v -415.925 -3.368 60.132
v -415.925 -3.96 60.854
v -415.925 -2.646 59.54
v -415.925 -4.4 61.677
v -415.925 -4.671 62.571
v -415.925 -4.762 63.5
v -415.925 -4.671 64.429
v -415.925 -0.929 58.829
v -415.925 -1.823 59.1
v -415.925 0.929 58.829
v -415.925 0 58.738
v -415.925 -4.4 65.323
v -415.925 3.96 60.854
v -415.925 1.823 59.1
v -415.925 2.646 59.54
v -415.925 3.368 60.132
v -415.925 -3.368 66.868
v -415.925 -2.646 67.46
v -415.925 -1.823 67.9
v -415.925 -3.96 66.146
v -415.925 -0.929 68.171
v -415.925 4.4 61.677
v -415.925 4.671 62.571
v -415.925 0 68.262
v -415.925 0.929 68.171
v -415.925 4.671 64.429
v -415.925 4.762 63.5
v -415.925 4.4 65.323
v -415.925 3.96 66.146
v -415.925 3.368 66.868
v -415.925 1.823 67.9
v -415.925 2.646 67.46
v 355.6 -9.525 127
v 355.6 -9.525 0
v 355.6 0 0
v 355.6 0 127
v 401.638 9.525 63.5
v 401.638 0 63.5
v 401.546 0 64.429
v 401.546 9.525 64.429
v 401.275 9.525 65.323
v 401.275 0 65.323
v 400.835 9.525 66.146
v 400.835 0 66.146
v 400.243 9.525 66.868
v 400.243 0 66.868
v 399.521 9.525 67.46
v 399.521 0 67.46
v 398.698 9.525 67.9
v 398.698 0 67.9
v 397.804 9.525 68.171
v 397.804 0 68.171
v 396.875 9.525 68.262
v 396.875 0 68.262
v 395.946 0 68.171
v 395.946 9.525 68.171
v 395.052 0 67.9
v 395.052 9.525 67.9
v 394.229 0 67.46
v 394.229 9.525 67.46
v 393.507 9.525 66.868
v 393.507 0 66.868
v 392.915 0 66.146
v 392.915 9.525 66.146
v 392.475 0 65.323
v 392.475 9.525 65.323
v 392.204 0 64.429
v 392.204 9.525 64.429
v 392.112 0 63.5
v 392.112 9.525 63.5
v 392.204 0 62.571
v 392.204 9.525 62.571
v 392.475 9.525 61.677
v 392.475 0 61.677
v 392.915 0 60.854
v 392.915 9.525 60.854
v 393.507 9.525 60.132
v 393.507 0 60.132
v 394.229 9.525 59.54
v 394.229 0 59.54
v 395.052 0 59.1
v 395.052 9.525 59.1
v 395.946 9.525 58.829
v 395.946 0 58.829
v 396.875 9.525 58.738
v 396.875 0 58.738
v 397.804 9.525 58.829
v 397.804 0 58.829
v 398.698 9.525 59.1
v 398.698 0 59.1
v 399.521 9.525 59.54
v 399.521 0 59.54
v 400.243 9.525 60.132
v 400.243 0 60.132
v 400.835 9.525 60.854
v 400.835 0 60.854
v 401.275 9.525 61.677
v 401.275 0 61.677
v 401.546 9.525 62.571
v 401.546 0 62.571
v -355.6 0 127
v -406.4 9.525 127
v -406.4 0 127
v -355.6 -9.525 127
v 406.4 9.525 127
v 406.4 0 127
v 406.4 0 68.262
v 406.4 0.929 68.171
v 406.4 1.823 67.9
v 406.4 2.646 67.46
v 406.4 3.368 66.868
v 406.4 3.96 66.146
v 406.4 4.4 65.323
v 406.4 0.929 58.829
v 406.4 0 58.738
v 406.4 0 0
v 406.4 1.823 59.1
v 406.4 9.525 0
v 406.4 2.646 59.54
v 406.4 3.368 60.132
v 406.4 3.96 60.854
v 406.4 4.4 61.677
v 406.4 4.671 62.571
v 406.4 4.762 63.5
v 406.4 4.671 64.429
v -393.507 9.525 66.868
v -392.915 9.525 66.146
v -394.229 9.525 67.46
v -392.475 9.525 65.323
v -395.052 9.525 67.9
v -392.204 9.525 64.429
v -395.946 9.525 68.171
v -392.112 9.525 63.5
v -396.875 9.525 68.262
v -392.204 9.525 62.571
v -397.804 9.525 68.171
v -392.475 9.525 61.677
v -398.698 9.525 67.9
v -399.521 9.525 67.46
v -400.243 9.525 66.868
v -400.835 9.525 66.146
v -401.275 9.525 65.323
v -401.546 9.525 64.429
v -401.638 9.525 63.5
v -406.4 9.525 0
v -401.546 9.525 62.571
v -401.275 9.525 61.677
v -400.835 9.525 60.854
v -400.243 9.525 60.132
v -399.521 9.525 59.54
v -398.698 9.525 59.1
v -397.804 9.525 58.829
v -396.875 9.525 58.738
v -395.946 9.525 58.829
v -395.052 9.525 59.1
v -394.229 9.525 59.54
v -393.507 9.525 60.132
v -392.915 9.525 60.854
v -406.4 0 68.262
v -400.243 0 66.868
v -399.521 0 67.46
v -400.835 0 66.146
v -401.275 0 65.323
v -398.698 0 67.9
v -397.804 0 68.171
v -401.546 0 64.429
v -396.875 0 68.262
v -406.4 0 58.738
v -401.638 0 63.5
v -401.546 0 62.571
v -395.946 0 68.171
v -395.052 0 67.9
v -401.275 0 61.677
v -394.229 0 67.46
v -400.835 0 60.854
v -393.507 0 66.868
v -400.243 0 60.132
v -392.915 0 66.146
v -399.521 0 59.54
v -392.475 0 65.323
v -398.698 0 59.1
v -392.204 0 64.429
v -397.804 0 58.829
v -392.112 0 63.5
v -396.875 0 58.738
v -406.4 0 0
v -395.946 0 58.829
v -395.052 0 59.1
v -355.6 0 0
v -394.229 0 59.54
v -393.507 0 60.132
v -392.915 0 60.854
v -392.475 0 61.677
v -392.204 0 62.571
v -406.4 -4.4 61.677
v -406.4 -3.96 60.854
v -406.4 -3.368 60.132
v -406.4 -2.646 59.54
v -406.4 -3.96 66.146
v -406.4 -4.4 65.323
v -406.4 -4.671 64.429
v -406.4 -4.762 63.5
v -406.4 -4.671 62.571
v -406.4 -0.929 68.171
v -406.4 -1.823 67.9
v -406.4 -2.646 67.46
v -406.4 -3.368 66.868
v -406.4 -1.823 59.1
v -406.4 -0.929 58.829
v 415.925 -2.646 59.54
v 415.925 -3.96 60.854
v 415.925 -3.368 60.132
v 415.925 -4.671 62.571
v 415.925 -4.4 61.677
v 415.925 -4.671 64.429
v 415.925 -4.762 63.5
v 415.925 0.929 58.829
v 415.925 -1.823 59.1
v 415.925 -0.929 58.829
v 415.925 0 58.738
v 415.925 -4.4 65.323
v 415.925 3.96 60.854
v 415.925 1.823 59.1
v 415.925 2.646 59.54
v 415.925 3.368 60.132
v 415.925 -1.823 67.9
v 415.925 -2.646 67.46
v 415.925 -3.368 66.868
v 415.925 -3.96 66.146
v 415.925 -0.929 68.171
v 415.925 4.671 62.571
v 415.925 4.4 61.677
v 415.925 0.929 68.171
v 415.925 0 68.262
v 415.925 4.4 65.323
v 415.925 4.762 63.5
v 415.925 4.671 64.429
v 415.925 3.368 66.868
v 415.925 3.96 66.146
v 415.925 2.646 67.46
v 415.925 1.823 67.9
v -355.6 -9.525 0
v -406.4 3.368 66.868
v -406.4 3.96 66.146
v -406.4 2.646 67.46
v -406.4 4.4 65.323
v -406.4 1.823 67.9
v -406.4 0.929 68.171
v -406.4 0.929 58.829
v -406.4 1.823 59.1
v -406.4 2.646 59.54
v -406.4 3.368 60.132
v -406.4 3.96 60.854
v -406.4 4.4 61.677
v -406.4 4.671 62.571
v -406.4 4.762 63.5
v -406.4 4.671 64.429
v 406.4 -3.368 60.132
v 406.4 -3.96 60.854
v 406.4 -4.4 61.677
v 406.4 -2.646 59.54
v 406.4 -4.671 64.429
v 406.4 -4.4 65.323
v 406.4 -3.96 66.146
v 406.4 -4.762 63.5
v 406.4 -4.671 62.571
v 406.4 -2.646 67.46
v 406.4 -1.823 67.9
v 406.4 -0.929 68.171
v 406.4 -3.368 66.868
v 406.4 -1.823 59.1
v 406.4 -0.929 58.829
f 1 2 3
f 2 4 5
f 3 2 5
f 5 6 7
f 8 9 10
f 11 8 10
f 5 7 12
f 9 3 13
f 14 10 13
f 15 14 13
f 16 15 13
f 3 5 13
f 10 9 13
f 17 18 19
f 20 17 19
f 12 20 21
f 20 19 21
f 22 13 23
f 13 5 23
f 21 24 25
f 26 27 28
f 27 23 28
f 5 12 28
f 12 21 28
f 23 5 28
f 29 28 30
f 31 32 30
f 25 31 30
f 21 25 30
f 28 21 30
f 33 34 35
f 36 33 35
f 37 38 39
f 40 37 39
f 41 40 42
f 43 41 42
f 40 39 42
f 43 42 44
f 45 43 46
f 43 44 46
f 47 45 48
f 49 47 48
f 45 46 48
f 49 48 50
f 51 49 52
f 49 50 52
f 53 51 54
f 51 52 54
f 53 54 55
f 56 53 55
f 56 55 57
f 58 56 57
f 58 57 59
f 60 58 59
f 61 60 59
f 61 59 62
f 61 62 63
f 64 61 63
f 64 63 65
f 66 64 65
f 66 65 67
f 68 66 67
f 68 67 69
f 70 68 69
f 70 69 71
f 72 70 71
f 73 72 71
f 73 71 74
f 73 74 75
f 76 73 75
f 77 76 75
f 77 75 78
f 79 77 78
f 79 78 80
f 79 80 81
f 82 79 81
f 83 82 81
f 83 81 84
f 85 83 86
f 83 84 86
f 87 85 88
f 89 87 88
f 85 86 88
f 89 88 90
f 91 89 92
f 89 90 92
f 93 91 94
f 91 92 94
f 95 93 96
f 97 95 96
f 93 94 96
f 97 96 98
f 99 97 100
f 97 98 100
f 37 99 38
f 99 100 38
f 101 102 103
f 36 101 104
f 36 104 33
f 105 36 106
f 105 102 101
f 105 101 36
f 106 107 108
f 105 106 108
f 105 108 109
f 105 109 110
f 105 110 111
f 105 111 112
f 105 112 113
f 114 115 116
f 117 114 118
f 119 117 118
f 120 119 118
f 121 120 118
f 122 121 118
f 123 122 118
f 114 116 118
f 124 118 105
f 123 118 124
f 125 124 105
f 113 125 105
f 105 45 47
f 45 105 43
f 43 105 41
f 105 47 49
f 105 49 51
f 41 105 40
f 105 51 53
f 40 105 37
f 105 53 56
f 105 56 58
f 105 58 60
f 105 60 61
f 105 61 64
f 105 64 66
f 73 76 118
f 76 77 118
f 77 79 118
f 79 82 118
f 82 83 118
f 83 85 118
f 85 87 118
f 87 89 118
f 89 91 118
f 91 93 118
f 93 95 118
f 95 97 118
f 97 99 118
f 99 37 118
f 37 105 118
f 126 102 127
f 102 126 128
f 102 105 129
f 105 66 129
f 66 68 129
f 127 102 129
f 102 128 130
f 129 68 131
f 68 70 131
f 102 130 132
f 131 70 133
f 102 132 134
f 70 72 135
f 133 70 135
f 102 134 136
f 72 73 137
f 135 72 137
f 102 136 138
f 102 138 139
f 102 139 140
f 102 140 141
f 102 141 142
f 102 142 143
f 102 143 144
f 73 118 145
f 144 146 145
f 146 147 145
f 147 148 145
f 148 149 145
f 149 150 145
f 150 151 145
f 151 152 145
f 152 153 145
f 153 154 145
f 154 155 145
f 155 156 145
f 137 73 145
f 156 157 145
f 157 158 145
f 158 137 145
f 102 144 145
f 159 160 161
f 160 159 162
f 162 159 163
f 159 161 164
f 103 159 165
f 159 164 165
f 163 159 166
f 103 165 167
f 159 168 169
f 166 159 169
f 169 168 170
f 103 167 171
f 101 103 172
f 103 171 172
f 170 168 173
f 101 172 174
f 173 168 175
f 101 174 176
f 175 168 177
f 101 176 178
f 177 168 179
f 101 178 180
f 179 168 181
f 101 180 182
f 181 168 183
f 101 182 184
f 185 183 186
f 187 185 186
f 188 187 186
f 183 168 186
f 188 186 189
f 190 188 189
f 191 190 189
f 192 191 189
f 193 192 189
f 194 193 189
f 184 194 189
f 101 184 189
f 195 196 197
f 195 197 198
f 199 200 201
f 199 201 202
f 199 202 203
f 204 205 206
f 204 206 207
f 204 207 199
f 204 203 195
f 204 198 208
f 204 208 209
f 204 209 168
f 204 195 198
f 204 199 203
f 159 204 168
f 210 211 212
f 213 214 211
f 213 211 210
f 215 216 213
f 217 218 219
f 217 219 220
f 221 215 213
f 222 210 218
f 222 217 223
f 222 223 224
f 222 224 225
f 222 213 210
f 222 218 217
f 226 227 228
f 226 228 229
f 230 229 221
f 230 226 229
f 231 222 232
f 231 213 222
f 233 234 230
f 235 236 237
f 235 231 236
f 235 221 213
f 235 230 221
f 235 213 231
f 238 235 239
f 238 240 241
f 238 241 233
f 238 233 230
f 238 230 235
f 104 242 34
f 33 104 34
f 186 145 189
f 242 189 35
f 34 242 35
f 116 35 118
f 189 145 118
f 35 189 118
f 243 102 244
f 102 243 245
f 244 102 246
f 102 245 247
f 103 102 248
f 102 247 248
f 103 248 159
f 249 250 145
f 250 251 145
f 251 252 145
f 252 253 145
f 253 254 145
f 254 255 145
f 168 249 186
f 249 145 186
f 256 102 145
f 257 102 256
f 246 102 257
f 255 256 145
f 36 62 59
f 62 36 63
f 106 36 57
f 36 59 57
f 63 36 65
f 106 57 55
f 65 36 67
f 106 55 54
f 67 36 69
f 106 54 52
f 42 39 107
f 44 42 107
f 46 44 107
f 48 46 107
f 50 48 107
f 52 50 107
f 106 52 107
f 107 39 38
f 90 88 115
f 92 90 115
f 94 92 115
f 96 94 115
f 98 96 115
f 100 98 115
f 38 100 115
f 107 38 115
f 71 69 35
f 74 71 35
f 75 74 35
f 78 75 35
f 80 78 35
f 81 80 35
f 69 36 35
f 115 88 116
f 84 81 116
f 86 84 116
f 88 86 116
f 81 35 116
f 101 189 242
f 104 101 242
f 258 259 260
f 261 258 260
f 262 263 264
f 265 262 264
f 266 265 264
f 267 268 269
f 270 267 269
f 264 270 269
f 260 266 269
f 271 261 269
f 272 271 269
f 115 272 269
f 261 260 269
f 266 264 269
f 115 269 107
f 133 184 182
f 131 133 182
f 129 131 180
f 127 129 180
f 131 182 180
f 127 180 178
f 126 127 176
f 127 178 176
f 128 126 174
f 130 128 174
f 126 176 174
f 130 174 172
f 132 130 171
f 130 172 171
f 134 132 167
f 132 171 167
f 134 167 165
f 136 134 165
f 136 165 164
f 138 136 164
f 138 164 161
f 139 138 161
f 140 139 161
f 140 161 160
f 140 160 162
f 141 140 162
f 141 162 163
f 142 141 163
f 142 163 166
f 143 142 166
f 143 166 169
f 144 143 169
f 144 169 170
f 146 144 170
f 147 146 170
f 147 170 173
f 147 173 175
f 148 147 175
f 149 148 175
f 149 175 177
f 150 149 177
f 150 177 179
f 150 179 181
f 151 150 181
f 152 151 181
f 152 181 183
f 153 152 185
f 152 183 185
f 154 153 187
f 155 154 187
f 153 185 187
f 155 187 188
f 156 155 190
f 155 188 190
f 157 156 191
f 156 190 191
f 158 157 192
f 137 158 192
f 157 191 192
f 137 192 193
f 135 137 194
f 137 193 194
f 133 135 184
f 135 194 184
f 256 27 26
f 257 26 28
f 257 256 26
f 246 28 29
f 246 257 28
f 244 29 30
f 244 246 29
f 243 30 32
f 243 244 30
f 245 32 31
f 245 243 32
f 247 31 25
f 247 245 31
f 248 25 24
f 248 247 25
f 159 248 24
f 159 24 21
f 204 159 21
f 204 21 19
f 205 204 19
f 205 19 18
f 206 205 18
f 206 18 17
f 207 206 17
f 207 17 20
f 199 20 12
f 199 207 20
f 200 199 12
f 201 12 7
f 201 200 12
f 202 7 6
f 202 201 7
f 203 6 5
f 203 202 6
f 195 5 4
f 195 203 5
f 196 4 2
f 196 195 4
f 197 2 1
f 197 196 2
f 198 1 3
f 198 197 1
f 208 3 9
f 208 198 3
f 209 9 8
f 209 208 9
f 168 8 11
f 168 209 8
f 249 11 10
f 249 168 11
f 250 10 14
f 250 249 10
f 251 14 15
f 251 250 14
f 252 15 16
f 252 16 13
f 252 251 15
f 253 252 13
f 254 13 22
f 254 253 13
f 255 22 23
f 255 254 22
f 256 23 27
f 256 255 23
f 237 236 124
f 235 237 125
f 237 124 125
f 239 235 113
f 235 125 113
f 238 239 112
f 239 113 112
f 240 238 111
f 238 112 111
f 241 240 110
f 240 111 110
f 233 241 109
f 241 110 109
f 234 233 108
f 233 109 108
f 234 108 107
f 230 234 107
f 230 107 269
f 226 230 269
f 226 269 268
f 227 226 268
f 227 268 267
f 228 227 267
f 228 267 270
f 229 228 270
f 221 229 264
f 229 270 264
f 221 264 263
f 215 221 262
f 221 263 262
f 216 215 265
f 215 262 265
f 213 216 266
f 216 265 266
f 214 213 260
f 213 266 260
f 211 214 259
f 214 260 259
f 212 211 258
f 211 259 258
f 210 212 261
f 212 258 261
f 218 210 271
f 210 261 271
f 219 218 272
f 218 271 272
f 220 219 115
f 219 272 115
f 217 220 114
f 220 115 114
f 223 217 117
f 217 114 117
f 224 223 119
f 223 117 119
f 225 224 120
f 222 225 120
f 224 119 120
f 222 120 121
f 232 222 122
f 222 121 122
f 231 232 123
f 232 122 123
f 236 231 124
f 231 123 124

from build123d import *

# Parameters (mm, degrees)
F1_DEPTH = 127
F3_R     = 4.7625
F4_DEPTH = 9.525
F6_R     = 4.7625
F7_DEPTH = 9.525
F8_R     = 4.7625
F9_DEPTH = 25.4


with BuildPart() as f1:
    # F0 (on Top) → F1 (new body)
    with BuildSketch(Plane.XY):
        Polygon((-355.6, 0), (-355.6, -9.525), (355.6, -9.525), (355.6, 0), (406.4, 0), (406.4, 9.525), (-406.4, 9.525), (-406.4, 0), align=None)
    extrude(amount=F1_DEPTH)

    # F3 (on offset) → F4 (join)
    with BuildSketch(Plane.YZ.offset(406.4)):
        with Locations((0, 63.5)):
            Circle(F3_R)
    extrude(amount=F4_DEPTH)

    # F6 (on offset) → F7 (join)
    with BuildSketch(Plane.YZ.offset(-406.4)):
        with Locations((0, 63.5)):
            Circle(F6_R)
    extrude(amount=-F7_DEPTH)

    # F8 (on Front) → F9 (cut)
    with BuildSketch(Plane.XZ):
        with Locations((396.875, 63.5)):
            Circle(F8_R)
        with Locations((-396.875, 63.5)):
            Circle(F8_R)
    extrude(amount=-F9_DEPTH, mode=Mode.SUBTRACT)


solid = f1.part
